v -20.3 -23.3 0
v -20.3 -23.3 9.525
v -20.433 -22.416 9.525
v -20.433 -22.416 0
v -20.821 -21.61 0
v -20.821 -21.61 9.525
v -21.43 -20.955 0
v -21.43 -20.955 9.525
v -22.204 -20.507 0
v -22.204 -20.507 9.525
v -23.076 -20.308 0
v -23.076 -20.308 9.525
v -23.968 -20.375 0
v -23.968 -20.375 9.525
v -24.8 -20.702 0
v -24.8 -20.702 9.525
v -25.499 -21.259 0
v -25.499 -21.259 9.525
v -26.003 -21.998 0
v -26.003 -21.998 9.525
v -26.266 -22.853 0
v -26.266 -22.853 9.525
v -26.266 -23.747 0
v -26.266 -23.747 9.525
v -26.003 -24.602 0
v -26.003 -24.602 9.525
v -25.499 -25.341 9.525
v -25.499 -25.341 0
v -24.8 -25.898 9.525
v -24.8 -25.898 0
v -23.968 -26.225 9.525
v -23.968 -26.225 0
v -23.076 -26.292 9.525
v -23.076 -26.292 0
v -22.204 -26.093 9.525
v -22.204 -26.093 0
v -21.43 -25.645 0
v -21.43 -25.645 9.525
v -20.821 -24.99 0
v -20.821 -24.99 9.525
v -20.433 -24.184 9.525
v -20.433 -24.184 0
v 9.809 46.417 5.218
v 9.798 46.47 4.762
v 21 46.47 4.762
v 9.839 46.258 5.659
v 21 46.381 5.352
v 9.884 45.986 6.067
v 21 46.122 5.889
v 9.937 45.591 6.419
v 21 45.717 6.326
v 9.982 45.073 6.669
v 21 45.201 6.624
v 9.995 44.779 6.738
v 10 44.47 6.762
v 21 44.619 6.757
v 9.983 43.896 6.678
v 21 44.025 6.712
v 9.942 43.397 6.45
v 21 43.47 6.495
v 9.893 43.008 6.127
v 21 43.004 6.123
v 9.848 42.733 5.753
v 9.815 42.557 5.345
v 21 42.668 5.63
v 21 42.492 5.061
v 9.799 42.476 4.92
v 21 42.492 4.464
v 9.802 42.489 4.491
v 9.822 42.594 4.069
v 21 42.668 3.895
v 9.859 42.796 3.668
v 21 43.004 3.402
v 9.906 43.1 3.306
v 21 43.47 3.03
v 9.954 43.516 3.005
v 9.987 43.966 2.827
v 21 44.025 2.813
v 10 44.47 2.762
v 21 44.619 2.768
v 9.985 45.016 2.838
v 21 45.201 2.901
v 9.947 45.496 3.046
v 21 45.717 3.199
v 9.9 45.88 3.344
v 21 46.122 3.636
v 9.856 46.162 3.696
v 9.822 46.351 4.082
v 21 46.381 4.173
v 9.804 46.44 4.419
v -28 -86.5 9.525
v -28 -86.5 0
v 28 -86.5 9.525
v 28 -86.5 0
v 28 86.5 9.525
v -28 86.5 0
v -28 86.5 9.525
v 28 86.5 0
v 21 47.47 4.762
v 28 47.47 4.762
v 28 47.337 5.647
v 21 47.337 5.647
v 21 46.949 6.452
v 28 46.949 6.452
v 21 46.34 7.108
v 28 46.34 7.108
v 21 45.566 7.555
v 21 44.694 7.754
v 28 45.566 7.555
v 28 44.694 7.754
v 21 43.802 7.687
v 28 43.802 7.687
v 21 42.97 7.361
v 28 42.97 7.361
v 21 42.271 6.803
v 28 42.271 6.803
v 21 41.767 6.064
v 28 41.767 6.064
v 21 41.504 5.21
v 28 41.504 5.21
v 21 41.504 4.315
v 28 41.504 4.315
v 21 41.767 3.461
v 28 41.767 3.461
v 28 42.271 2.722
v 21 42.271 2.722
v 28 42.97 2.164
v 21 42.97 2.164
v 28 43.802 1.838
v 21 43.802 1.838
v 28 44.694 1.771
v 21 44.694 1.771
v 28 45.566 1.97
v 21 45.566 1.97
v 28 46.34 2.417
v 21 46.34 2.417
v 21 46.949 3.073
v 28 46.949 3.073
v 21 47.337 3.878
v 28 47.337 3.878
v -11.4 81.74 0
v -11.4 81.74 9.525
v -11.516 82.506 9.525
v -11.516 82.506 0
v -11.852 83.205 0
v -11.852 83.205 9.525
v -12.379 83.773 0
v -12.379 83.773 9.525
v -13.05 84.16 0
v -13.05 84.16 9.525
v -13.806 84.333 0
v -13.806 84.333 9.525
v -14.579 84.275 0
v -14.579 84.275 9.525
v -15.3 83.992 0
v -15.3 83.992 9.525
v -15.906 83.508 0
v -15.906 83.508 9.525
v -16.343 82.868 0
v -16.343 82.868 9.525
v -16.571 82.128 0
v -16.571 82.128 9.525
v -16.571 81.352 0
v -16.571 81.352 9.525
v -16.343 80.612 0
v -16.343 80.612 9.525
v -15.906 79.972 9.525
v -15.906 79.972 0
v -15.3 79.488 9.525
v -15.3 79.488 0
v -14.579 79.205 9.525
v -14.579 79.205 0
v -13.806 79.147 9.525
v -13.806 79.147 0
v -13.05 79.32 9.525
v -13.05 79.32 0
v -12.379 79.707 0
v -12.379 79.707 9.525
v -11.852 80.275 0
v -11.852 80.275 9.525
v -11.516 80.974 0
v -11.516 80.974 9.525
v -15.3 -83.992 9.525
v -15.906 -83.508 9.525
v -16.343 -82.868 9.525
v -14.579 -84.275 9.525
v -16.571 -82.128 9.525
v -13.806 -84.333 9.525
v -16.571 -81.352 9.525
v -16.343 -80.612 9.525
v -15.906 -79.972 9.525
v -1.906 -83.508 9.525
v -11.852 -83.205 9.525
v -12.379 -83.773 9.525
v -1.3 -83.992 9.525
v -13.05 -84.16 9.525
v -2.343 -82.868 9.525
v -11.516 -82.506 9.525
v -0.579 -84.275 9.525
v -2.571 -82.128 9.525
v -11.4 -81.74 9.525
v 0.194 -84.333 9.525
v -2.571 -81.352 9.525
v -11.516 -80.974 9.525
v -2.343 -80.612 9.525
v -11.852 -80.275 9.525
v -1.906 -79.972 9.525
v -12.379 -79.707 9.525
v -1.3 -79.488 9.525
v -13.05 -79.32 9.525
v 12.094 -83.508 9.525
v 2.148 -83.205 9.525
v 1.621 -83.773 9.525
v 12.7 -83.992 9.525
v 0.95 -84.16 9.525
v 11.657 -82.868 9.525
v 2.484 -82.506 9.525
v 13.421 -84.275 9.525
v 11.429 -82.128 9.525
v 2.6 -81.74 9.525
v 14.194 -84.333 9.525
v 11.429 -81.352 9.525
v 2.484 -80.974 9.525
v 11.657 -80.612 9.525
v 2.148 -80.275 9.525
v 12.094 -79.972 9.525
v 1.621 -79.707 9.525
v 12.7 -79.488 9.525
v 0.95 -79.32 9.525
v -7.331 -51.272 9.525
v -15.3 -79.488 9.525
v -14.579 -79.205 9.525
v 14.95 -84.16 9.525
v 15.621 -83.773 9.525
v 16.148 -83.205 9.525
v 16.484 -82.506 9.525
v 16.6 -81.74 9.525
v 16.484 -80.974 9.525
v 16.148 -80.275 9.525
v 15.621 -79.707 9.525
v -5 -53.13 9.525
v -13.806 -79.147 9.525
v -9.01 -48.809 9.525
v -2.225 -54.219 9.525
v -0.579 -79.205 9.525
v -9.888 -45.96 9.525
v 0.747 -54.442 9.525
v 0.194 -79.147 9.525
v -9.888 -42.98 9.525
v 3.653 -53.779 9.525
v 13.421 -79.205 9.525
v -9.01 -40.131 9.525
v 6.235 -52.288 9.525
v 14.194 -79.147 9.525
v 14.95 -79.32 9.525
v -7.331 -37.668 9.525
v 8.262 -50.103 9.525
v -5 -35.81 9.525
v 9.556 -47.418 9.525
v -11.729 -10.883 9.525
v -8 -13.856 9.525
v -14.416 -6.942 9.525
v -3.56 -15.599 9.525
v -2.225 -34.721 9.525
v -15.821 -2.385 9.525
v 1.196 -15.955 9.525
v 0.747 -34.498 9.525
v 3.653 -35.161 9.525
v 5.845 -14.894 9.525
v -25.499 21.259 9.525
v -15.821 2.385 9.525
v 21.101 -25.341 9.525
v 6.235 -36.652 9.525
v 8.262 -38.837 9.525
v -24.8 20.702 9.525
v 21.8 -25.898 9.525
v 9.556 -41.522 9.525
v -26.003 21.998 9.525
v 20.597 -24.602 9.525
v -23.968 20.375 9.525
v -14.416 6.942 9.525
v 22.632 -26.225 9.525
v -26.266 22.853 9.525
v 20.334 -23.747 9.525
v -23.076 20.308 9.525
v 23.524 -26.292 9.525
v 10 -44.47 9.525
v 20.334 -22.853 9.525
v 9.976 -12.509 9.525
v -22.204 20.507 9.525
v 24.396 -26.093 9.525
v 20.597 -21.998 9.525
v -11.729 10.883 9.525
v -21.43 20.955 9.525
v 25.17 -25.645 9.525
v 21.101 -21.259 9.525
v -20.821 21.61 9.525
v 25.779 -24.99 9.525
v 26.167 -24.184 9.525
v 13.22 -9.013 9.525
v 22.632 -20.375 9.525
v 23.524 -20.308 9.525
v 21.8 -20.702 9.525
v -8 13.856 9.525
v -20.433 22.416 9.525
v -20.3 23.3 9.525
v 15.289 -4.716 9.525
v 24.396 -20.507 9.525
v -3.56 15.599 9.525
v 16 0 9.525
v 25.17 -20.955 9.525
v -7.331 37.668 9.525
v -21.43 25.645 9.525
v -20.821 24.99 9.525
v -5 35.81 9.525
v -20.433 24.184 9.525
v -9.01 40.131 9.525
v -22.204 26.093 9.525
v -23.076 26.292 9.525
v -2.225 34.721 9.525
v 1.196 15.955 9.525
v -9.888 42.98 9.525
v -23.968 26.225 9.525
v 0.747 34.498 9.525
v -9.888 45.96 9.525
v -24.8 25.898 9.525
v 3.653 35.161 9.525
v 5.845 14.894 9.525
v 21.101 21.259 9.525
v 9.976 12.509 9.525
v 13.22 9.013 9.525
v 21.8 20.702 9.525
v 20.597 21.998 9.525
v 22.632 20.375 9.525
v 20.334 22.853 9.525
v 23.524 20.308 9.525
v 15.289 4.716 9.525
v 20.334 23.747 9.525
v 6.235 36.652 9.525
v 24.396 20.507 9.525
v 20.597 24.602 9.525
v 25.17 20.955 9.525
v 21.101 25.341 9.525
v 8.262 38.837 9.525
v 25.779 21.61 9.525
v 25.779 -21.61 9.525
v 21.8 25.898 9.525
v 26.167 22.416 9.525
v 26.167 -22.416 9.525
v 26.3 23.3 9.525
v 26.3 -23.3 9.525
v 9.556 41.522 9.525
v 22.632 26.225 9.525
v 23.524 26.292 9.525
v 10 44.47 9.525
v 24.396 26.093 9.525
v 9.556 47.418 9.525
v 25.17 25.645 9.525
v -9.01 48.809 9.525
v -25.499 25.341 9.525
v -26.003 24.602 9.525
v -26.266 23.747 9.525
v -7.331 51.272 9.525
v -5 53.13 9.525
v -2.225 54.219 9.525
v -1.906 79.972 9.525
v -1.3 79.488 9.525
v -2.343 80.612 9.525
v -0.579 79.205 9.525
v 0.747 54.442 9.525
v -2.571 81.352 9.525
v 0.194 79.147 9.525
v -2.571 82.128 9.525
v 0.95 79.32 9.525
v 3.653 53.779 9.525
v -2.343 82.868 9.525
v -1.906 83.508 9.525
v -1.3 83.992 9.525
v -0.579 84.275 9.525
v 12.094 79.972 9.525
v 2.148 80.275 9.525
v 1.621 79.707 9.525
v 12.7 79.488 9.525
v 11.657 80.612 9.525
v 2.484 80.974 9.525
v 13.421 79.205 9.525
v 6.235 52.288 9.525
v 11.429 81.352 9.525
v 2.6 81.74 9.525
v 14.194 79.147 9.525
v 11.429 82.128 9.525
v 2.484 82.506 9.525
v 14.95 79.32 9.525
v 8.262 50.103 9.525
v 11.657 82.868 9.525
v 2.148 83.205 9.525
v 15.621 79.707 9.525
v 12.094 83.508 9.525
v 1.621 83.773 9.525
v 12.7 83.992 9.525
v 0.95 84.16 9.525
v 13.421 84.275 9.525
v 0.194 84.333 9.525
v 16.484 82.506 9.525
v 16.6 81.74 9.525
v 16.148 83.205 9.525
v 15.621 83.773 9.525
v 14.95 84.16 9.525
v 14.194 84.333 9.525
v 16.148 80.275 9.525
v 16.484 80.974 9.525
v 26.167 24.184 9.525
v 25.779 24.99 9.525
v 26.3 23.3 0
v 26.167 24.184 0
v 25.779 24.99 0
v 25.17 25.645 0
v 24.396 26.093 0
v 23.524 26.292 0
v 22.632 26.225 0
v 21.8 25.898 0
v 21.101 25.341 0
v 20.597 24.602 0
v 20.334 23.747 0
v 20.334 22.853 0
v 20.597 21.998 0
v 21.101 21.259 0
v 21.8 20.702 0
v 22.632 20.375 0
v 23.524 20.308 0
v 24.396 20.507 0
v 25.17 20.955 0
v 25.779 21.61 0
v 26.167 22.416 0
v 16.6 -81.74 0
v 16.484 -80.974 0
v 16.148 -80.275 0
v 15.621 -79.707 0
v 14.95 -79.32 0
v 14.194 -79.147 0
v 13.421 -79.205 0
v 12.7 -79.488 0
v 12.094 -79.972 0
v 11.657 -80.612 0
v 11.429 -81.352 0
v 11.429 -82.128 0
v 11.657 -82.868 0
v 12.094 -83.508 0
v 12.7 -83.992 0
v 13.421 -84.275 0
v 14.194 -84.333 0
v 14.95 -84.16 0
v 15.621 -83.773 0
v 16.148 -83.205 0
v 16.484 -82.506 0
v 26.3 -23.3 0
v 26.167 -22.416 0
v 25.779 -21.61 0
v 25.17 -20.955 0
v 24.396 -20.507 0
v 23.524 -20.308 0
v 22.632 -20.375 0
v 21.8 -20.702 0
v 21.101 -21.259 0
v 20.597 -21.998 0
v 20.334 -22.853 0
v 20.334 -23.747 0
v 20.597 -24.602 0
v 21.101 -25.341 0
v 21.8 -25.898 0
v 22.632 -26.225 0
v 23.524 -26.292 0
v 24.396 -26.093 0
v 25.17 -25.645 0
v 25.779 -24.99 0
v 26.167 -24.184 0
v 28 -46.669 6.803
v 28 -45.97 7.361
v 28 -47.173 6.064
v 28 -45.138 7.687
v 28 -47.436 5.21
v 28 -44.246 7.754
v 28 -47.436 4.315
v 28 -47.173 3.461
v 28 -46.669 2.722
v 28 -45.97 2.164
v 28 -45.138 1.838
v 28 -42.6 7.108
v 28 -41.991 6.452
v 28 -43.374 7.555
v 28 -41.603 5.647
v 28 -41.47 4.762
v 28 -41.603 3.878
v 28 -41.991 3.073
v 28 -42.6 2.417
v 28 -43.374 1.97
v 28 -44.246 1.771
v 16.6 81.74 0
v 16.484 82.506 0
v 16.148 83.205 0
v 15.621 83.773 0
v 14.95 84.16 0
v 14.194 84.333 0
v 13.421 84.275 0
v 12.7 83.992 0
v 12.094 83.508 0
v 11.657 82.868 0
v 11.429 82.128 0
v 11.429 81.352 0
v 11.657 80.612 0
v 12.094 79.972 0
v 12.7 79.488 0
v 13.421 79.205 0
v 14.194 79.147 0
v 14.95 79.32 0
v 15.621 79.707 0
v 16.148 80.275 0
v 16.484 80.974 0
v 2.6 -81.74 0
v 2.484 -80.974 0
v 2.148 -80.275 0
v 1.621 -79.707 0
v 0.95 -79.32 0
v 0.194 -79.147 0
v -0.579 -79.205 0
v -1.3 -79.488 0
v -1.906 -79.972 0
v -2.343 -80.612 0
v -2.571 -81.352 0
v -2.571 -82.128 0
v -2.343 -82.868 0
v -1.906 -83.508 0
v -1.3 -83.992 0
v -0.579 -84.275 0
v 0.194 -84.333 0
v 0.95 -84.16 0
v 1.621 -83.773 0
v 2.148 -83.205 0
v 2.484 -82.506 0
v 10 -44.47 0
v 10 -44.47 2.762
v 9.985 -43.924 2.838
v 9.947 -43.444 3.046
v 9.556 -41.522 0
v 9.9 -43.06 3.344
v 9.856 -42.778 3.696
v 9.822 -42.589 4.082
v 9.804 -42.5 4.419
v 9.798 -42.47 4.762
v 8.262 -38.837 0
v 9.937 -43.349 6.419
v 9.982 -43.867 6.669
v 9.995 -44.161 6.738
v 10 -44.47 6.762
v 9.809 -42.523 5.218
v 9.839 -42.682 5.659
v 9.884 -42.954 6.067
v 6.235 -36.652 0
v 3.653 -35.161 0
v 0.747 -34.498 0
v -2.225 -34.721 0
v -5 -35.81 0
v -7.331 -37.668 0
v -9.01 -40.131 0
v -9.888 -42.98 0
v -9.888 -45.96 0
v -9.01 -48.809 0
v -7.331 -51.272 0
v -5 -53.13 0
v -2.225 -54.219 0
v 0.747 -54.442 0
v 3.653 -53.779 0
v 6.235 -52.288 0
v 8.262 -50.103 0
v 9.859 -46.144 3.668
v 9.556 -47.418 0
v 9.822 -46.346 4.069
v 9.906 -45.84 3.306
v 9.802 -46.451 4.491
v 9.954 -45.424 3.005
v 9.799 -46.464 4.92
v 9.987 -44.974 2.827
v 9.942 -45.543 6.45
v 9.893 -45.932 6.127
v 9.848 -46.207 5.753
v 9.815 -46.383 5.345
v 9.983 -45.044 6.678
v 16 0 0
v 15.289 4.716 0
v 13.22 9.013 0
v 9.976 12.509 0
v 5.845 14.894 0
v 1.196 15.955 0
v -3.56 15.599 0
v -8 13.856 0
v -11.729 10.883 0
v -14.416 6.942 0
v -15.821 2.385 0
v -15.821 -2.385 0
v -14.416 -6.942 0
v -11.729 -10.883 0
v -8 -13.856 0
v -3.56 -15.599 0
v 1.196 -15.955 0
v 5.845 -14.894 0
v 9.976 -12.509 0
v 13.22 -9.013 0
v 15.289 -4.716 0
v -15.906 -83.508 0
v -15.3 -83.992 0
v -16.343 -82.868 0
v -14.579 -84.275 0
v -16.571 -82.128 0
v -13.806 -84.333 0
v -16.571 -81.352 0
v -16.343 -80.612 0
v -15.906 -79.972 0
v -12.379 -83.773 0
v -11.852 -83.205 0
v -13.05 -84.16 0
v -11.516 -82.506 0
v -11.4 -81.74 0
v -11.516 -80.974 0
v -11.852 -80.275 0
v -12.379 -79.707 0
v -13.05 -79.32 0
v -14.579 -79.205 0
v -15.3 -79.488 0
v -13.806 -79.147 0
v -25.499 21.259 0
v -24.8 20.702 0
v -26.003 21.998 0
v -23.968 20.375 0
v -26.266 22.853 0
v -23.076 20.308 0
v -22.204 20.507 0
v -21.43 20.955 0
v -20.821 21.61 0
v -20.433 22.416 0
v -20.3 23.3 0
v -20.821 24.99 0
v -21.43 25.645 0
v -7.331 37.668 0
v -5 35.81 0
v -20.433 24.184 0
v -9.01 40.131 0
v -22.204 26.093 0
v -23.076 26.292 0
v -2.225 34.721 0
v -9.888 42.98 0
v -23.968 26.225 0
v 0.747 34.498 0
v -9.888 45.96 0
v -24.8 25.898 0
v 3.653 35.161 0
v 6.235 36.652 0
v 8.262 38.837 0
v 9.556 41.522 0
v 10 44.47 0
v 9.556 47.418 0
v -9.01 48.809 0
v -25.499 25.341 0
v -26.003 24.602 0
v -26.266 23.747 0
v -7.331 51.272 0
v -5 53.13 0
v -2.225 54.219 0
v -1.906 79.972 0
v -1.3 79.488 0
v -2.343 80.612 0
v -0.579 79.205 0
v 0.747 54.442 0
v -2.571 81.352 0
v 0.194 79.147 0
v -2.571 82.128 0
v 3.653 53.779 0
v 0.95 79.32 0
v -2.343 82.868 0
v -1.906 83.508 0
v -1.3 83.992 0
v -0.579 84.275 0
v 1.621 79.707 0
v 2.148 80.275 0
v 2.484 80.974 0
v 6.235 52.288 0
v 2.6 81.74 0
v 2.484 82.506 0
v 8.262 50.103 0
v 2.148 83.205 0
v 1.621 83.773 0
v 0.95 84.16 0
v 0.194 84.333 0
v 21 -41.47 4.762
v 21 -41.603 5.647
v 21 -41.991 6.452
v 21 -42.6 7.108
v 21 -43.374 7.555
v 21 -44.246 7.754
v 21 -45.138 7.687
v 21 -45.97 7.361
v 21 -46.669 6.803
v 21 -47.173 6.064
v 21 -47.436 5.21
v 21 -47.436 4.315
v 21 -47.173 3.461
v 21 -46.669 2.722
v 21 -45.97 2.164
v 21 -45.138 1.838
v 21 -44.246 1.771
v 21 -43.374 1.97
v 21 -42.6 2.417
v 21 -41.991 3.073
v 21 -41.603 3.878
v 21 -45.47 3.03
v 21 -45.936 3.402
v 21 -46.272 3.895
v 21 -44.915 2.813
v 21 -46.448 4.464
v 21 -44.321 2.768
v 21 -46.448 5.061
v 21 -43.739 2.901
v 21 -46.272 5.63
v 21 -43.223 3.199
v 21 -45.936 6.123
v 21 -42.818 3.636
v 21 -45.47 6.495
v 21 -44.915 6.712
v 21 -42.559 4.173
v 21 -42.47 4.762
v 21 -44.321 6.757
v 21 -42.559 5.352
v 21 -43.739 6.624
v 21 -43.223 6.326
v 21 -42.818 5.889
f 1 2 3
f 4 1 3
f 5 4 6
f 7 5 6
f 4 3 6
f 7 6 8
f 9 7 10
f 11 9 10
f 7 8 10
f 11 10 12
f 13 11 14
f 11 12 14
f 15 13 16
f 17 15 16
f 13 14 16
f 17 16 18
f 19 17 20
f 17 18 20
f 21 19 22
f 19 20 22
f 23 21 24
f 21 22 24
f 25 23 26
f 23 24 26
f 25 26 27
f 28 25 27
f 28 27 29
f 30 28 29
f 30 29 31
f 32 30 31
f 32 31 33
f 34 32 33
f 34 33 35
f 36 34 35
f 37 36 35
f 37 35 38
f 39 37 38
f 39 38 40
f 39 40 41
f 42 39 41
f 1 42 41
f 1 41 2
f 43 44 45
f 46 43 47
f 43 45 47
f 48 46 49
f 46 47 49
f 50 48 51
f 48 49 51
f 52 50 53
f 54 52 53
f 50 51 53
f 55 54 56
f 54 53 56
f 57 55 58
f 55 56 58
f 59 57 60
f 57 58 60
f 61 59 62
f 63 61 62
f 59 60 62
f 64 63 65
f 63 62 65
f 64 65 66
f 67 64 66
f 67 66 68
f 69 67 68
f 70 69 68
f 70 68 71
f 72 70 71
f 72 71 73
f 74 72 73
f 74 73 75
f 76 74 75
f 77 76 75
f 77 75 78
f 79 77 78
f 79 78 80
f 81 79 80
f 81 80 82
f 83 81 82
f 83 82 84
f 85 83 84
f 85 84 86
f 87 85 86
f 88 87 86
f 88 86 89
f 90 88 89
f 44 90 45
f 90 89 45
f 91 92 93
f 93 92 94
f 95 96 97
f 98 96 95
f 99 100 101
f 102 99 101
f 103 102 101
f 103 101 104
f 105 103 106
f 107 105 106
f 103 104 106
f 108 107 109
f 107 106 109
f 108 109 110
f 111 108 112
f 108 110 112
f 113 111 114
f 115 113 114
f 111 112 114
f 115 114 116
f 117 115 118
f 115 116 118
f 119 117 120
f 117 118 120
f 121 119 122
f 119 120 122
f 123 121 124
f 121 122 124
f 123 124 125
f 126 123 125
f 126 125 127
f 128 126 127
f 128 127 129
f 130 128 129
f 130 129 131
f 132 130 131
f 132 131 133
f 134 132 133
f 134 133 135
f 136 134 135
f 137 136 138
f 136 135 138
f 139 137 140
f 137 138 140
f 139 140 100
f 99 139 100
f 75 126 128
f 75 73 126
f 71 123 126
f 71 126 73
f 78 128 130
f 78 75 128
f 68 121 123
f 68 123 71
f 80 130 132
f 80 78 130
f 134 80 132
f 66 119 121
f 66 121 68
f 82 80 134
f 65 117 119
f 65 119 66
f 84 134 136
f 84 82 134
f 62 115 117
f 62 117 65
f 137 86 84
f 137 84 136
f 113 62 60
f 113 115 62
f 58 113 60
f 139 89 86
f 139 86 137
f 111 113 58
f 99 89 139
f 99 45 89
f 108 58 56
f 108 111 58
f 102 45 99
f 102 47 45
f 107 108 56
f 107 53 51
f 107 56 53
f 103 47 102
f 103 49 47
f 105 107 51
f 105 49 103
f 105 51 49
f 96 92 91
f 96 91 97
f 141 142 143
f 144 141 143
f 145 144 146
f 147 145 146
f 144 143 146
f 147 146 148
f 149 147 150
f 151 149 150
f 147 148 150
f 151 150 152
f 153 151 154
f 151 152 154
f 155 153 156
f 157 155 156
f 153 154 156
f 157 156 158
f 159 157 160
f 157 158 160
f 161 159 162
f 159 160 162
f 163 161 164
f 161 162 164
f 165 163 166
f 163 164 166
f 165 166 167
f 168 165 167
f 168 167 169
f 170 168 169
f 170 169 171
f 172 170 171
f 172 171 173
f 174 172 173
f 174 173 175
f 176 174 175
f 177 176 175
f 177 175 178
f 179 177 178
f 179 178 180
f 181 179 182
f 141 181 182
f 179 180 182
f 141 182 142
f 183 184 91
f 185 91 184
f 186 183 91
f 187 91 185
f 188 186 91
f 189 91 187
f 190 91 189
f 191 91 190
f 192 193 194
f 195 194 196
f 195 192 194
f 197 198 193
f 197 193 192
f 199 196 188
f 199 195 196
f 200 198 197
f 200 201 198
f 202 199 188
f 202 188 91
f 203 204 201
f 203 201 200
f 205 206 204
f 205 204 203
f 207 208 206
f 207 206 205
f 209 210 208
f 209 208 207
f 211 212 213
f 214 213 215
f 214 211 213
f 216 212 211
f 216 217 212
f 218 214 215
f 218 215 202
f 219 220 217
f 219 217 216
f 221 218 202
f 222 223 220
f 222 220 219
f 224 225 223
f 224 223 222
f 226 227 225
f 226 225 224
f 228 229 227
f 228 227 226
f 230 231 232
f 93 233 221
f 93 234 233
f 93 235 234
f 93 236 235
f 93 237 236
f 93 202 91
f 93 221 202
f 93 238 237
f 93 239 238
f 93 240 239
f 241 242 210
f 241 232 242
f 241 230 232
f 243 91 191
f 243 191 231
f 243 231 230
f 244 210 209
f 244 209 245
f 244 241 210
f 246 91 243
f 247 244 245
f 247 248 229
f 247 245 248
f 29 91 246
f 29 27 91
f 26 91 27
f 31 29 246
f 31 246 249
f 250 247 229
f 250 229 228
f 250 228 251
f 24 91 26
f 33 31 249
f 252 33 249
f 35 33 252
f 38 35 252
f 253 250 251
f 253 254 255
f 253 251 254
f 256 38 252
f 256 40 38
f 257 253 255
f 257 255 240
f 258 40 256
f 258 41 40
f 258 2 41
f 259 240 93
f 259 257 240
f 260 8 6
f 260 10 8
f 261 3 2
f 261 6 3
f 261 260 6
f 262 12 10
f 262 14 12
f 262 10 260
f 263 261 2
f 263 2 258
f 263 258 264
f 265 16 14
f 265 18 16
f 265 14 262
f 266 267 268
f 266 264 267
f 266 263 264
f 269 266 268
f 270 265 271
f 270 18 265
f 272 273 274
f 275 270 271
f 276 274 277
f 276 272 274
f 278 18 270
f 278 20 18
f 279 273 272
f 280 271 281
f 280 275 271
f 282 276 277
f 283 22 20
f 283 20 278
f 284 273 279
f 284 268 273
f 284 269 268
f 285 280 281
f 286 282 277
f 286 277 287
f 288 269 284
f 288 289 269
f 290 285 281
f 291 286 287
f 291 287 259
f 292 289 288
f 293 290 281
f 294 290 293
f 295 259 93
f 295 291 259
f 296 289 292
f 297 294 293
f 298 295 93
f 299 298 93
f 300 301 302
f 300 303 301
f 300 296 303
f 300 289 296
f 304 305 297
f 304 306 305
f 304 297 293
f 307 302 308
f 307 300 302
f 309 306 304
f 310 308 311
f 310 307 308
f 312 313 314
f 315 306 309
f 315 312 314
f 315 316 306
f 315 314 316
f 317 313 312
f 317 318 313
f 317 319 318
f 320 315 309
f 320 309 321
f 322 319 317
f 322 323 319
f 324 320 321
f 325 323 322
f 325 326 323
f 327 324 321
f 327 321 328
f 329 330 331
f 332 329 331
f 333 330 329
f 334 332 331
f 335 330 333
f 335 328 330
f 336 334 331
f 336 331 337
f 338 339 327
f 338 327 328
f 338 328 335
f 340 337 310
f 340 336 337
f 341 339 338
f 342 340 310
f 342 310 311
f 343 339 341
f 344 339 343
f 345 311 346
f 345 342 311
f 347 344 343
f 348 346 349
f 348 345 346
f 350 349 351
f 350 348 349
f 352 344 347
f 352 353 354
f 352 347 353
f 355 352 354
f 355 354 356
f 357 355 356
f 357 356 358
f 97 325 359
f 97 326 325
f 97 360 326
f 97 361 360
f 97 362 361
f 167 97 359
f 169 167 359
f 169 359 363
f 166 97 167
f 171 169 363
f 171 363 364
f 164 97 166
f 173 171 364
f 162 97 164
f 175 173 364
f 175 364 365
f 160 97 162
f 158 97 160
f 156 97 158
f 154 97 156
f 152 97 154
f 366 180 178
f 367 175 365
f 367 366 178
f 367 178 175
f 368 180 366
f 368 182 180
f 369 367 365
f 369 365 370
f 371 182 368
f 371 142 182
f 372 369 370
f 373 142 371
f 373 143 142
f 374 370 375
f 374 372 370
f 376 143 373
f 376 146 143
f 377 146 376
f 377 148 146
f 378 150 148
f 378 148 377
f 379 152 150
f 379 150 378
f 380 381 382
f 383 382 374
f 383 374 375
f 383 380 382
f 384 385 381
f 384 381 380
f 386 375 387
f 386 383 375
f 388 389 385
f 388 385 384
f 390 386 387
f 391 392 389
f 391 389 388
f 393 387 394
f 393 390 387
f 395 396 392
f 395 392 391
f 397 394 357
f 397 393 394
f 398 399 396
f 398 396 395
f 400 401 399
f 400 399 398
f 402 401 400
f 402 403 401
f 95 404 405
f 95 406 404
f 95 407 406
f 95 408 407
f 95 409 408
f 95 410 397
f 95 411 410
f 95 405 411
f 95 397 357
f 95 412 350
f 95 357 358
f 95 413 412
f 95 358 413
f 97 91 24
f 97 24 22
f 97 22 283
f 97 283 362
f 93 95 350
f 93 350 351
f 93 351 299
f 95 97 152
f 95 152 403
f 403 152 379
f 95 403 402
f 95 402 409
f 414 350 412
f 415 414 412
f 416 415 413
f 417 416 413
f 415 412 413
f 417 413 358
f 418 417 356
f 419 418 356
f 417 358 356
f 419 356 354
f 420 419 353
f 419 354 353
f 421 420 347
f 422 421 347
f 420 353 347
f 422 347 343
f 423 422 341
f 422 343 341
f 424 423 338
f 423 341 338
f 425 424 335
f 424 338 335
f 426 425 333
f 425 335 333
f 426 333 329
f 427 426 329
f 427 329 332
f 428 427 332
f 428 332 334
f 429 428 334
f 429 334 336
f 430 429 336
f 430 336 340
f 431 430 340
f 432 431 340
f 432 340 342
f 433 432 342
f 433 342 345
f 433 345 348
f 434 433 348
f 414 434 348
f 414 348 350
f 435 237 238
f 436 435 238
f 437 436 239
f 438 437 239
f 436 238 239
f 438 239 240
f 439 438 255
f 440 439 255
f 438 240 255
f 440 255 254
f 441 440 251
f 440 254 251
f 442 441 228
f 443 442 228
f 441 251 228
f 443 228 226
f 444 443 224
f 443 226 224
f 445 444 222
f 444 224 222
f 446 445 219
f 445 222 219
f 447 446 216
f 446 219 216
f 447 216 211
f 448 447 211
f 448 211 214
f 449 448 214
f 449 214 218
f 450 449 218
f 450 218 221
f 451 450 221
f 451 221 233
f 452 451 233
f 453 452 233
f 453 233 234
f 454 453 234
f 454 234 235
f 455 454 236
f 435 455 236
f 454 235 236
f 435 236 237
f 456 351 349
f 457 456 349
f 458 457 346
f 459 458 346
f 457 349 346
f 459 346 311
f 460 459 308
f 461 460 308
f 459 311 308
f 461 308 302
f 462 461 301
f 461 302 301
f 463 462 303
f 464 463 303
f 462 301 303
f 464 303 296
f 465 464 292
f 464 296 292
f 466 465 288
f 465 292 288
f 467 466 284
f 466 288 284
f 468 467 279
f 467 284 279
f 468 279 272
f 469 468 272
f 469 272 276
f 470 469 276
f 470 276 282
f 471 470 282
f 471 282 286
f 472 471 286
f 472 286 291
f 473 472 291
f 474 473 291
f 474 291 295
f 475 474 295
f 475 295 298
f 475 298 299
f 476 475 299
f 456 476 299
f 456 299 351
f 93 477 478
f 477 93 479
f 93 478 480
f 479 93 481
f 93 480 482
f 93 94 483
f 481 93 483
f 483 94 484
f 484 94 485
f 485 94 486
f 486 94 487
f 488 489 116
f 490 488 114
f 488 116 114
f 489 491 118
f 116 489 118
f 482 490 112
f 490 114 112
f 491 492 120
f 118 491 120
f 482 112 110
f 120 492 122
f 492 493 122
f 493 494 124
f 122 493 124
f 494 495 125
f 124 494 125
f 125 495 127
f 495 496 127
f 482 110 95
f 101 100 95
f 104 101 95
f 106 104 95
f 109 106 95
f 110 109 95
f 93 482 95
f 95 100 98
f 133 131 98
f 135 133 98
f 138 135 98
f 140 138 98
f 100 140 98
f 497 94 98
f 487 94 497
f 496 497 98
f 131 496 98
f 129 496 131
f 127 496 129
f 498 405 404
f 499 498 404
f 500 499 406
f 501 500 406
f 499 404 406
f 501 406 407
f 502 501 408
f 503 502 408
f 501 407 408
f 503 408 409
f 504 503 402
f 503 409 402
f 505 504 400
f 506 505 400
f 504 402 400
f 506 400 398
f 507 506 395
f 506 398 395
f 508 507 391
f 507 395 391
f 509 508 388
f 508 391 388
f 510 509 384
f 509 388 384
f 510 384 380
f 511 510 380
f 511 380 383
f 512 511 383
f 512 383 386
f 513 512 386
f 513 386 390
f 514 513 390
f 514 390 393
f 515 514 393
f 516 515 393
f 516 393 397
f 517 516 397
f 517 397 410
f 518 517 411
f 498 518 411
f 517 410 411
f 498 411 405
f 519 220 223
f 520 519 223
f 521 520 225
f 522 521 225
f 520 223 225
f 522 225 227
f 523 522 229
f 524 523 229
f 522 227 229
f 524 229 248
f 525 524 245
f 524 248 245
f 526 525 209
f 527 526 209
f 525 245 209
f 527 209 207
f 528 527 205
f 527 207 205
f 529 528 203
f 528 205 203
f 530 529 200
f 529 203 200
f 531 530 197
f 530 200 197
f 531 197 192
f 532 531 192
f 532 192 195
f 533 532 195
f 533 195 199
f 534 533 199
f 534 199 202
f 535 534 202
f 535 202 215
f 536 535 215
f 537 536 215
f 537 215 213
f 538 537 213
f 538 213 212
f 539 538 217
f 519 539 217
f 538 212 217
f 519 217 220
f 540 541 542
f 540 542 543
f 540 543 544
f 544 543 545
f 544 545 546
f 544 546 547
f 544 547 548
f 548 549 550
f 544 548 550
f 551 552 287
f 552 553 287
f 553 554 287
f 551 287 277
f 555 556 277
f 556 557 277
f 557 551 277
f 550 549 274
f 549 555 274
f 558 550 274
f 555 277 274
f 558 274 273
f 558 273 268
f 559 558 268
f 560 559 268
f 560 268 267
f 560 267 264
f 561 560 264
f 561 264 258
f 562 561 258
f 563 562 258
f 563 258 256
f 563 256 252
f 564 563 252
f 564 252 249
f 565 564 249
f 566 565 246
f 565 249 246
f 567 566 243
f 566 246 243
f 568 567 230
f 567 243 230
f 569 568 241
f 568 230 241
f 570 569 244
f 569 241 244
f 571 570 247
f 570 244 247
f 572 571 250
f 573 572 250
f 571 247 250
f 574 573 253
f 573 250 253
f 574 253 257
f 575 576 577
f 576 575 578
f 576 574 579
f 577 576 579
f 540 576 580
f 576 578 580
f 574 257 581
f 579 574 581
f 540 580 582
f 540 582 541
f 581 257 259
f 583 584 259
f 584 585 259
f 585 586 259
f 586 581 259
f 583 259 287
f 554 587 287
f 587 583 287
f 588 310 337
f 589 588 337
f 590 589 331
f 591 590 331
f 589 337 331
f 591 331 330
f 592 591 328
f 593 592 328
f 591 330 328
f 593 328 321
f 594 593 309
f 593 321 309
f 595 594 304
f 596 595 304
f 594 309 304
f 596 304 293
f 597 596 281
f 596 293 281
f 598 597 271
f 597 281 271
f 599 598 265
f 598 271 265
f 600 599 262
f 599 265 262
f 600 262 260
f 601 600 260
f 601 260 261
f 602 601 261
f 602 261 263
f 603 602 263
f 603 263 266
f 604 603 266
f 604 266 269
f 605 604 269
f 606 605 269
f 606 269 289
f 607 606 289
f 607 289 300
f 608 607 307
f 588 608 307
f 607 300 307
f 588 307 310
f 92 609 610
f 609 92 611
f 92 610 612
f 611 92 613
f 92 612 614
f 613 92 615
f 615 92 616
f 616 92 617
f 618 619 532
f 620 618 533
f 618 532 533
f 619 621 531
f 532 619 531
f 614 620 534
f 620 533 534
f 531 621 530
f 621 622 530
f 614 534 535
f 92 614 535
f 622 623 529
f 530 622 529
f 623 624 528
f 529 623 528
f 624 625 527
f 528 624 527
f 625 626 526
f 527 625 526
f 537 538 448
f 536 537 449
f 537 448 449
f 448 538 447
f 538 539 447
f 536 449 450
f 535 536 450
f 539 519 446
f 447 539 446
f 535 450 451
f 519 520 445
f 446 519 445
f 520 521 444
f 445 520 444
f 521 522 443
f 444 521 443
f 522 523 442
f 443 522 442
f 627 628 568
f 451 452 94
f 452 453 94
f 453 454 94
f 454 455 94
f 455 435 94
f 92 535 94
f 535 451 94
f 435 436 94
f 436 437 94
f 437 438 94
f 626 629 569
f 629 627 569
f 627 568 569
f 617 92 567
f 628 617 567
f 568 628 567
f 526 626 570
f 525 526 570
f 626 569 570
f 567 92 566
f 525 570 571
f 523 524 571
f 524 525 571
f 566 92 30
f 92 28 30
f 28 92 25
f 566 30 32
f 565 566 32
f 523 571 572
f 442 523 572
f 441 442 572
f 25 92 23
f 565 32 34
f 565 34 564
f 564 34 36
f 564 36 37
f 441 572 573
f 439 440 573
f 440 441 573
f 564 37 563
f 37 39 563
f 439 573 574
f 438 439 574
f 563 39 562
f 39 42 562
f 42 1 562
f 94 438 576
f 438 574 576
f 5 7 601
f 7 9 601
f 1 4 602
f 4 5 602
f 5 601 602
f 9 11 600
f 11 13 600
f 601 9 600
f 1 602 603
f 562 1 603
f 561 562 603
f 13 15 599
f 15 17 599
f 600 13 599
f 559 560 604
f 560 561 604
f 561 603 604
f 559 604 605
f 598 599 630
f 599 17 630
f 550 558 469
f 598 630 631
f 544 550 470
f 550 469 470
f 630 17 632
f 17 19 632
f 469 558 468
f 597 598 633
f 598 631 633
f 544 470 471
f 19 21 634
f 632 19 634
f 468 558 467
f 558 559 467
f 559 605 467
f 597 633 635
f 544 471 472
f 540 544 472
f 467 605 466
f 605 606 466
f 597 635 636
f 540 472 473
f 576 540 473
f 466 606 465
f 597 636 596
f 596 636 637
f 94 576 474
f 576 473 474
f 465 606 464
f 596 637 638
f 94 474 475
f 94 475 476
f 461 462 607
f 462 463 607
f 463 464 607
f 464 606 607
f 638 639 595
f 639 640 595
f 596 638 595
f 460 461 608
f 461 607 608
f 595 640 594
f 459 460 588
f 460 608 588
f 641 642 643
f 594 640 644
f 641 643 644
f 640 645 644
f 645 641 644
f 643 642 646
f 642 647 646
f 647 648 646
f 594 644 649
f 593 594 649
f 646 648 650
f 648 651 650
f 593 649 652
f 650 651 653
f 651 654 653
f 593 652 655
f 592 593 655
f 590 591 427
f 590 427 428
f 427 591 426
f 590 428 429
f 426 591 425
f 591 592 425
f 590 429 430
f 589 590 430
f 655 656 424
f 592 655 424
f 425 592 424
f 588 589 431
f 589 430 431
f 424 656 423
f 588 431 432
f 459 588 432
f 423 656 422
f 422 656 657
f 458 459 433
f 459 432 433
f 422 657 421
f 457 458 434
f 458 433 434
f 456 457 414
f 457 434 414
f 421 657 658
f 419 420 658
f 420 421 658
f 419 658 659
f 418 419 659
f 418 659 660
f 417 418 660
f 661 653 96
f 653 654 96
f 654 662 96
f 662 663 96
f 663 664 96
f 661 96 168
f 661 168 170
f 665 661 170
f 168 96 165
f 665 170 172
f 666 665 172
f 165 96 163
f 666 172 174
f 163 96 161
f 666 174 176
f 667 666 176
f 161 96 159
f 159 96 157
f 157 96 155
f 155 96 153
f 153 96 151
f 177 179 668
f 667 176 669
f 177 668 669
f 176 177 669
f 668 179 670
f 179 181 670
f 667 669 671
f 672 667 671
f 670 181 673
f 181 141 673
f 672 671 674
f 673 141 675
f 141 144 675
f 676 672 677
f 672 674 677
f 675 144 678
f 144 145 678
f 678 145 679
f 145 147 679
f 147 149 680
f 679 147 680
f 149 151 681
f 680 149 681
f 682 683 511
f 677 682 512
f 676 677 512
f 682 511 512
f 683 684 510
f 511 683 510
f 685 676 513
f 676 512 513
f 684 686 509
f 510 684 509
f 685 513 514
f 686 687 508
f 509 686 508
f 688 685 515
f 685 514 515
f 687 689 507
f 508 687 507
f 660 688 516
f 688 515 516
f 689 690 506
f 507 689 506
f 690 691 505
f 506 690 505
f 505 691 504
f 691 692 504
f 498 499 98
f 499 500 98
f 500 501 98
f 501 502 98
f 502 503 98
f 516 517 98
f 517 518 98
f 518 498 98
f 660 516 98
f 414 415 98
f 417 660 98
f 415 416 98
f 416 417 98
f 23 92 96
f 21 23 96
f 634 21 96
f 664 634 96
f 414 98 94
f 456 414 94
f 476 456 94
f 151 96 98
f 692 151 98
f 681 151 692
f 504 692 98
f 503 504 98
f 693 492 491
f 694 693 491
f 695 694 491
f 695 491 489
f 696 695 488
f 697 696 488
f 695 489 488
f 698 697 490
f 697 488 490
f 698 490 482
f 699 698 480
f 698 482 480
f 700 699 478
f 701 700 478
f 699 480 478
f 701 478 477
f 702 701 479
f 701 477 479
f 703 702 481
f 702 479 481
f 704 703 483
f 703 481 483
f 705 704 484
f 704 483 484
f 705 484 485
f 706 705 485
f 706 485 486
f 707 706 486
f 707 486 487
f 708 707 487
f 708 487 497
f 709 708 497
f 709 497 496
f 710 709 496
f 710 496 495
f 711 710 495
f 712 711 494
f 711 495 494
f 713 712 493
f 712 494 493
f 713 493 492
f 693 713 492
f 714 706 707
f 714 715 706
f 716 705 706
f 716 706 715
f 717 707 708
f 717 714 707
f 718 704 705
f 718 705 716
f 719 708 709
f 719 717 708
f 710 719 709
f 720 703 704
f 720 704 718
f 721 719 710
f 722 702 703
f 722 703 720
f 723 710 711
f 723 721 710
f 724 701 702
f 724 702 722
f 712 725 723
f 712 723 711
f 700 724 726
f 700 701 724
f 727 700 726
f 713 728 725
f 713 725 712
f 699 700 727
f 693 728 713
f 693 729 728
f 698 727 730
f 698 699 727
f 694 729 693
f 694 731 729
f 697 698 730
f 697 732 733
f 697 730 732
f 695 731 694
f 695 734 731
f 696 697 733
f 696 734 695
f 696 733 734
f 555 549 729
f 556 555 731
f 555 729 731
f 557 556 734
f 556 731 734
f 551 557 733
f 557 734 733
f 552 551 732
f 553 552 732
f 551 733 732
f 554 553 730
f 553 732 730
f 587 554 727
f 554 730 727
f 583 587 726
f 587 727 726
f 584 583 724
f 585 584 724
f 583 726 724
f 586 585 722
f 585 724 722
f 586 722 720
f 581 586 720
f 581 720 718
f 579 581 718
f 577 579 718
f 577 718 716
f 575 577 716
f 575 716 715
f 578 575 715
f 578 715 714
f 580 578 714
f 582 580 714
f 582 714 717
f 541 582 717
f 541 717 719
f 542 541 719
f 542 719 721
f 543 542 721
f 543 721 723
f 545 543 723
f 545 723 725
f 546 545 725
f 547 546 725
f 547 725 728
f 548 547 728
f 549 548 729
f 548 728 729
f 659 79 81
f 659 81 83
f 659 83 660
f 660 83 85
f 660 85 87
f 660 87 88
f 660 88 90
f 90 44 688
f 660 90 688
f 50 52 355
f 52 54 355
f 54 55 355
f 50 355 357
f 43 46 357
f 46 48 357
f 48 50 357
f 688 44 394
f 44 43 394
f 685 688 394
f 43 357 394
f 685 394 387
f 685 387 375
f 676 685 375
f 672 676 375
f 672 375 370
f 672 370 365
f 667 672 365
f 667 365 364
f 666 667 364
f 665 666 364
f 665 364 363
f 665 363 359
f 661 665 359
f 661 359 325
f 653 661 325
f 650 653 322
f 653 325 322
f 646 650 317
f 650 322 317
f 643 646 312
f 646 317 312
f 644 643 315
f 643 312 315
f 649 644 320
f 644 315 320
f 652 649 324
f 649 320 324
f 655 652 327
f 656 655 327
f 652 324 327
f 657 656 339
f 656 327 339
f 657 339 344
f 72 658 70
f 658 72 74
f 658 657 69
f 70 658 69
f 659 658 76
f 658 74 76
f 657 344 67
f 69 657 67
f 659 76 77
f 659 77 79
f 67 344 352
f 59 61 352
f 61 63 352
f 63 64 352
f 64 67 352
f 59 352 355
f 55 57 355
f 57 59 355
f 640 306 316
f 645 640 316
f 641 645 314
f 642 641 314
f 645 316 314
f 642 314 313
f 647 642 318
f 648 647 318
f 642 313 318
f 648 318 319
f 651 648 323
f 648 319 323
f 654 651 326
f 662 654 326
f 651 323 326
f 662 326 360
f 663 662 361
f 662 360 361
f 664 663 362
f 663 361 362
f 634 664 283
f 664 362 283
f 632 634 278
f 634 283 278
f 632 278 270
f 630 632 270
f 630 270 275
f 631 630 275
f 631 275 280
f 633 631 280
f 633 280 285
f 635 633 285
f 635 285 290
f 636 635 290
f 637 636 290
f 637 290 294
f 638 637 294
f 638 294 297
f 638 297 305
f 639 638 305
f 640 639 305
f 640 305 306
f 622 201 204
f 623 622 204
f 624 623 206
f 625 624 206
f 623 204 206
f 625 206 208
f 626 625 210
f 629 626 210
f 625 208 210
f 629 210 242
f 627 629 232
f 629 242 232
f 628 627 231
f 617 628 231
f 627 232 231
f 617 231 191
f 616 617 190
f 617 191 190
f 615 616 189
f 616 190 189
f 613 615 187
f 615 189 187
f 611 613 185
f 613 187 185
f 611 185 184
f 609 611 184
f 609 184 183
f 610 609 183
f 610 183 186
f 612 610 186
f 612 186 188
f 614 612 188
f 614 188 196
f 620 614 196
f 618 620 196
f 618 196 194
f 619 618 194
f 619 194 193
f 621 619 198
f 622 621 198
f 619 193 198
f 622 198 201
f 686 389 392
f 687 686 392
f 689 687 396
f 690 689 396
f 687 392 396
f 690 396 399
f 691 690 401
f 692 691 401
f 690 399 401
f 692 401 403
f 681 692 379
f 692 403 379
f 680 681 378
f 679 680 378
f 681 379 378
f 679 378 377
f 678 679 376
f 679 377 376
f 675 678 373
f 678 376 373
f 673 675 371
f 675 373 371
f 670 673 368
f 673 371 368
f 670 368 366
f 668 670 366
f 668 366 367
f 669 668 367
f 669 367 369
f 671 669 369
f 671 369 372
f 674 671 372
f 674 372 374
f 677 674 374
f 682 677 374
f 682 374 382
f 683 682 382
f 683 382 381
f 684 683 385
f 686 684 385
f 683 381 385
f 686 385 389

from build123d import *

# Parameters (mm, degrees)
ESBO_O1_W                = 56
ESBO_O1_H                = 173
RESSALTO_EXTRUS_O1_DEPTH = 9.525
ESBO_O2_R                = 16
ESBO_O2_R_2              = 10
ESBO_O2_R_3              = 2.6
CORTE_EXTRUS_O1_DEPTH    = 9.525
CORTAR_EXTRUIR2_REACH    = 105.484
CROQUIS1_R               = 2
CROQUIS2_R               = 3
CORTAR_EXTRUIR3_DEPTH    = 7
ESBO_O3_R                = 3
CORTE_EXTRUS_O2_DEPTH    = 92.416495376


with BuildPart() as part:
    # Esboço1 → Ressalto-extrusão1 (new body)
    with BuildSketch(Plane.XY):
        Rectangle(ESBO_O1_W, ESBO_O1_H)
    extrude(amount=RESSALTO_EXTRUS_O1_DEPTH)

    # Esboço2 → Corte-extrusão1 (cut)
    with BuildSketch(Plane.XY.offset(9.525)):
        Circle(ESBO_O2_R)
        with Locations((0, 44.47)):
            Circle(ESBO_O2_R_2)
        with Locations((0, -44.47)):
            Circle(ESBO_O2_R_2)
        with Locations((0, 81.74)):
            Circle(ESBO_O2_R_3)
        with Locations((14, 81.74)):
            Circle(ESBO_O2_R_3)
        with Locations((-14, 81.74)):
            Circle(ESBO_O2_R_3)
        with Locations((14, -81.74)):
            Circle(ESBO_O2_R_3)
        with Locations((0, -81.74)):
            Circle(ESBO_O2_R_3)
        with Locations((-14, -81.74)):
            Circle(ESBO_O2_R_3)
    extrude(amount=-CORTE_EXTRUS_O1_DEPTH, mode=Mode.SUBTRACT)

    # Croquis1 → Cortar-Extruir2 (cut, up to next)
    with BuildSketch(Plane(origin=(28, 0, 0), x_dir=(0, 0, -1), z_dir=(1, 0, 0)), mode=Mode.PRIVATE) as cortar_extruir2_sk1:
        with Locations(Location((-4.7625, -44.47, 0), (0, 0, 90))):
            Circle(CROQUIS1_R)
    cortar_extruir2_tool1 = extrude(cortar_extruir2_sk1.sketch, amount=-CORTAR_EXTRUIR2_REACH, mode=Mode.PRIVATE) & part.part
    # Croquis1 → Cortar-Extruir2 (cut, up to next)
    with BuildSketch(Plane(origin=(28, 0, 0), x_dir=(0, 0, -1), z_dir=(1, 0, 0)), mode=Mode.PRIVATE) as cortar_extruir2_sk2:
        with Locations(Location((-4.7625, 44.47, 0), (0, 0, 90))):
            Circle(CROQUIS1_R)
    cortar_extruir2_tool2 = extrude(cortar_extruir2_sk2.sketch, amount=-CORTAR_EXTRUIR2_REACH, mode=Mode.PRIVATE) & part.part
    add(cortar_extruir2_tool1.solids().sort_by_distance((28, -44.47, 4.7625))[0], mode=Mode.SUBTRACT)
    add(cortar_extruir2_tool2.solids().sort_by_distance((28, 44.47, 4.7625))[0], mode=Mode.SUBTRACT)

    # Croquis2 → Cortar-Extruir3 (cut)
    with BuildSketch(Plane(origin=(28, 0, 0), x_dir=(0, 0, -1), z_dir=(1, 0, 0))):
        with Locations(Location((-4.7625, -44.47, 0), (0, 0, 90))):
            Circle(CROQUIS2_R)
        with Locations(Location((-4.7625, 44.47, 0), (0, 0, 90))):
            Circle(CROQUIS2_R)
    extrude(amount=-CORTAR_EXTRUIR3_DEPTH, mode=Mode.SUBTRACT)

    # Esboço3 → Corte-extrusão2 (cut, through all)
    with BuildSketch(Plane.XY.offset(9.525)):
        with Locations((-23.3, 23.3)):
            Circle(ESBO_O3_R)
        with Locations((23.3, 23.3)):
            Circle(ESBO_O3_R)
        with Locations((23.3, -23.3)):
            Circle(ESBO_O3_R)
        with Locations((-23.3, -23.3)):
            Circle(ESBO_O3_R)
    extrude(amount=-CORTE_EXTRUS_O2_DEPTH, mode=Mode.SUBTRACT)


solid = part.part
